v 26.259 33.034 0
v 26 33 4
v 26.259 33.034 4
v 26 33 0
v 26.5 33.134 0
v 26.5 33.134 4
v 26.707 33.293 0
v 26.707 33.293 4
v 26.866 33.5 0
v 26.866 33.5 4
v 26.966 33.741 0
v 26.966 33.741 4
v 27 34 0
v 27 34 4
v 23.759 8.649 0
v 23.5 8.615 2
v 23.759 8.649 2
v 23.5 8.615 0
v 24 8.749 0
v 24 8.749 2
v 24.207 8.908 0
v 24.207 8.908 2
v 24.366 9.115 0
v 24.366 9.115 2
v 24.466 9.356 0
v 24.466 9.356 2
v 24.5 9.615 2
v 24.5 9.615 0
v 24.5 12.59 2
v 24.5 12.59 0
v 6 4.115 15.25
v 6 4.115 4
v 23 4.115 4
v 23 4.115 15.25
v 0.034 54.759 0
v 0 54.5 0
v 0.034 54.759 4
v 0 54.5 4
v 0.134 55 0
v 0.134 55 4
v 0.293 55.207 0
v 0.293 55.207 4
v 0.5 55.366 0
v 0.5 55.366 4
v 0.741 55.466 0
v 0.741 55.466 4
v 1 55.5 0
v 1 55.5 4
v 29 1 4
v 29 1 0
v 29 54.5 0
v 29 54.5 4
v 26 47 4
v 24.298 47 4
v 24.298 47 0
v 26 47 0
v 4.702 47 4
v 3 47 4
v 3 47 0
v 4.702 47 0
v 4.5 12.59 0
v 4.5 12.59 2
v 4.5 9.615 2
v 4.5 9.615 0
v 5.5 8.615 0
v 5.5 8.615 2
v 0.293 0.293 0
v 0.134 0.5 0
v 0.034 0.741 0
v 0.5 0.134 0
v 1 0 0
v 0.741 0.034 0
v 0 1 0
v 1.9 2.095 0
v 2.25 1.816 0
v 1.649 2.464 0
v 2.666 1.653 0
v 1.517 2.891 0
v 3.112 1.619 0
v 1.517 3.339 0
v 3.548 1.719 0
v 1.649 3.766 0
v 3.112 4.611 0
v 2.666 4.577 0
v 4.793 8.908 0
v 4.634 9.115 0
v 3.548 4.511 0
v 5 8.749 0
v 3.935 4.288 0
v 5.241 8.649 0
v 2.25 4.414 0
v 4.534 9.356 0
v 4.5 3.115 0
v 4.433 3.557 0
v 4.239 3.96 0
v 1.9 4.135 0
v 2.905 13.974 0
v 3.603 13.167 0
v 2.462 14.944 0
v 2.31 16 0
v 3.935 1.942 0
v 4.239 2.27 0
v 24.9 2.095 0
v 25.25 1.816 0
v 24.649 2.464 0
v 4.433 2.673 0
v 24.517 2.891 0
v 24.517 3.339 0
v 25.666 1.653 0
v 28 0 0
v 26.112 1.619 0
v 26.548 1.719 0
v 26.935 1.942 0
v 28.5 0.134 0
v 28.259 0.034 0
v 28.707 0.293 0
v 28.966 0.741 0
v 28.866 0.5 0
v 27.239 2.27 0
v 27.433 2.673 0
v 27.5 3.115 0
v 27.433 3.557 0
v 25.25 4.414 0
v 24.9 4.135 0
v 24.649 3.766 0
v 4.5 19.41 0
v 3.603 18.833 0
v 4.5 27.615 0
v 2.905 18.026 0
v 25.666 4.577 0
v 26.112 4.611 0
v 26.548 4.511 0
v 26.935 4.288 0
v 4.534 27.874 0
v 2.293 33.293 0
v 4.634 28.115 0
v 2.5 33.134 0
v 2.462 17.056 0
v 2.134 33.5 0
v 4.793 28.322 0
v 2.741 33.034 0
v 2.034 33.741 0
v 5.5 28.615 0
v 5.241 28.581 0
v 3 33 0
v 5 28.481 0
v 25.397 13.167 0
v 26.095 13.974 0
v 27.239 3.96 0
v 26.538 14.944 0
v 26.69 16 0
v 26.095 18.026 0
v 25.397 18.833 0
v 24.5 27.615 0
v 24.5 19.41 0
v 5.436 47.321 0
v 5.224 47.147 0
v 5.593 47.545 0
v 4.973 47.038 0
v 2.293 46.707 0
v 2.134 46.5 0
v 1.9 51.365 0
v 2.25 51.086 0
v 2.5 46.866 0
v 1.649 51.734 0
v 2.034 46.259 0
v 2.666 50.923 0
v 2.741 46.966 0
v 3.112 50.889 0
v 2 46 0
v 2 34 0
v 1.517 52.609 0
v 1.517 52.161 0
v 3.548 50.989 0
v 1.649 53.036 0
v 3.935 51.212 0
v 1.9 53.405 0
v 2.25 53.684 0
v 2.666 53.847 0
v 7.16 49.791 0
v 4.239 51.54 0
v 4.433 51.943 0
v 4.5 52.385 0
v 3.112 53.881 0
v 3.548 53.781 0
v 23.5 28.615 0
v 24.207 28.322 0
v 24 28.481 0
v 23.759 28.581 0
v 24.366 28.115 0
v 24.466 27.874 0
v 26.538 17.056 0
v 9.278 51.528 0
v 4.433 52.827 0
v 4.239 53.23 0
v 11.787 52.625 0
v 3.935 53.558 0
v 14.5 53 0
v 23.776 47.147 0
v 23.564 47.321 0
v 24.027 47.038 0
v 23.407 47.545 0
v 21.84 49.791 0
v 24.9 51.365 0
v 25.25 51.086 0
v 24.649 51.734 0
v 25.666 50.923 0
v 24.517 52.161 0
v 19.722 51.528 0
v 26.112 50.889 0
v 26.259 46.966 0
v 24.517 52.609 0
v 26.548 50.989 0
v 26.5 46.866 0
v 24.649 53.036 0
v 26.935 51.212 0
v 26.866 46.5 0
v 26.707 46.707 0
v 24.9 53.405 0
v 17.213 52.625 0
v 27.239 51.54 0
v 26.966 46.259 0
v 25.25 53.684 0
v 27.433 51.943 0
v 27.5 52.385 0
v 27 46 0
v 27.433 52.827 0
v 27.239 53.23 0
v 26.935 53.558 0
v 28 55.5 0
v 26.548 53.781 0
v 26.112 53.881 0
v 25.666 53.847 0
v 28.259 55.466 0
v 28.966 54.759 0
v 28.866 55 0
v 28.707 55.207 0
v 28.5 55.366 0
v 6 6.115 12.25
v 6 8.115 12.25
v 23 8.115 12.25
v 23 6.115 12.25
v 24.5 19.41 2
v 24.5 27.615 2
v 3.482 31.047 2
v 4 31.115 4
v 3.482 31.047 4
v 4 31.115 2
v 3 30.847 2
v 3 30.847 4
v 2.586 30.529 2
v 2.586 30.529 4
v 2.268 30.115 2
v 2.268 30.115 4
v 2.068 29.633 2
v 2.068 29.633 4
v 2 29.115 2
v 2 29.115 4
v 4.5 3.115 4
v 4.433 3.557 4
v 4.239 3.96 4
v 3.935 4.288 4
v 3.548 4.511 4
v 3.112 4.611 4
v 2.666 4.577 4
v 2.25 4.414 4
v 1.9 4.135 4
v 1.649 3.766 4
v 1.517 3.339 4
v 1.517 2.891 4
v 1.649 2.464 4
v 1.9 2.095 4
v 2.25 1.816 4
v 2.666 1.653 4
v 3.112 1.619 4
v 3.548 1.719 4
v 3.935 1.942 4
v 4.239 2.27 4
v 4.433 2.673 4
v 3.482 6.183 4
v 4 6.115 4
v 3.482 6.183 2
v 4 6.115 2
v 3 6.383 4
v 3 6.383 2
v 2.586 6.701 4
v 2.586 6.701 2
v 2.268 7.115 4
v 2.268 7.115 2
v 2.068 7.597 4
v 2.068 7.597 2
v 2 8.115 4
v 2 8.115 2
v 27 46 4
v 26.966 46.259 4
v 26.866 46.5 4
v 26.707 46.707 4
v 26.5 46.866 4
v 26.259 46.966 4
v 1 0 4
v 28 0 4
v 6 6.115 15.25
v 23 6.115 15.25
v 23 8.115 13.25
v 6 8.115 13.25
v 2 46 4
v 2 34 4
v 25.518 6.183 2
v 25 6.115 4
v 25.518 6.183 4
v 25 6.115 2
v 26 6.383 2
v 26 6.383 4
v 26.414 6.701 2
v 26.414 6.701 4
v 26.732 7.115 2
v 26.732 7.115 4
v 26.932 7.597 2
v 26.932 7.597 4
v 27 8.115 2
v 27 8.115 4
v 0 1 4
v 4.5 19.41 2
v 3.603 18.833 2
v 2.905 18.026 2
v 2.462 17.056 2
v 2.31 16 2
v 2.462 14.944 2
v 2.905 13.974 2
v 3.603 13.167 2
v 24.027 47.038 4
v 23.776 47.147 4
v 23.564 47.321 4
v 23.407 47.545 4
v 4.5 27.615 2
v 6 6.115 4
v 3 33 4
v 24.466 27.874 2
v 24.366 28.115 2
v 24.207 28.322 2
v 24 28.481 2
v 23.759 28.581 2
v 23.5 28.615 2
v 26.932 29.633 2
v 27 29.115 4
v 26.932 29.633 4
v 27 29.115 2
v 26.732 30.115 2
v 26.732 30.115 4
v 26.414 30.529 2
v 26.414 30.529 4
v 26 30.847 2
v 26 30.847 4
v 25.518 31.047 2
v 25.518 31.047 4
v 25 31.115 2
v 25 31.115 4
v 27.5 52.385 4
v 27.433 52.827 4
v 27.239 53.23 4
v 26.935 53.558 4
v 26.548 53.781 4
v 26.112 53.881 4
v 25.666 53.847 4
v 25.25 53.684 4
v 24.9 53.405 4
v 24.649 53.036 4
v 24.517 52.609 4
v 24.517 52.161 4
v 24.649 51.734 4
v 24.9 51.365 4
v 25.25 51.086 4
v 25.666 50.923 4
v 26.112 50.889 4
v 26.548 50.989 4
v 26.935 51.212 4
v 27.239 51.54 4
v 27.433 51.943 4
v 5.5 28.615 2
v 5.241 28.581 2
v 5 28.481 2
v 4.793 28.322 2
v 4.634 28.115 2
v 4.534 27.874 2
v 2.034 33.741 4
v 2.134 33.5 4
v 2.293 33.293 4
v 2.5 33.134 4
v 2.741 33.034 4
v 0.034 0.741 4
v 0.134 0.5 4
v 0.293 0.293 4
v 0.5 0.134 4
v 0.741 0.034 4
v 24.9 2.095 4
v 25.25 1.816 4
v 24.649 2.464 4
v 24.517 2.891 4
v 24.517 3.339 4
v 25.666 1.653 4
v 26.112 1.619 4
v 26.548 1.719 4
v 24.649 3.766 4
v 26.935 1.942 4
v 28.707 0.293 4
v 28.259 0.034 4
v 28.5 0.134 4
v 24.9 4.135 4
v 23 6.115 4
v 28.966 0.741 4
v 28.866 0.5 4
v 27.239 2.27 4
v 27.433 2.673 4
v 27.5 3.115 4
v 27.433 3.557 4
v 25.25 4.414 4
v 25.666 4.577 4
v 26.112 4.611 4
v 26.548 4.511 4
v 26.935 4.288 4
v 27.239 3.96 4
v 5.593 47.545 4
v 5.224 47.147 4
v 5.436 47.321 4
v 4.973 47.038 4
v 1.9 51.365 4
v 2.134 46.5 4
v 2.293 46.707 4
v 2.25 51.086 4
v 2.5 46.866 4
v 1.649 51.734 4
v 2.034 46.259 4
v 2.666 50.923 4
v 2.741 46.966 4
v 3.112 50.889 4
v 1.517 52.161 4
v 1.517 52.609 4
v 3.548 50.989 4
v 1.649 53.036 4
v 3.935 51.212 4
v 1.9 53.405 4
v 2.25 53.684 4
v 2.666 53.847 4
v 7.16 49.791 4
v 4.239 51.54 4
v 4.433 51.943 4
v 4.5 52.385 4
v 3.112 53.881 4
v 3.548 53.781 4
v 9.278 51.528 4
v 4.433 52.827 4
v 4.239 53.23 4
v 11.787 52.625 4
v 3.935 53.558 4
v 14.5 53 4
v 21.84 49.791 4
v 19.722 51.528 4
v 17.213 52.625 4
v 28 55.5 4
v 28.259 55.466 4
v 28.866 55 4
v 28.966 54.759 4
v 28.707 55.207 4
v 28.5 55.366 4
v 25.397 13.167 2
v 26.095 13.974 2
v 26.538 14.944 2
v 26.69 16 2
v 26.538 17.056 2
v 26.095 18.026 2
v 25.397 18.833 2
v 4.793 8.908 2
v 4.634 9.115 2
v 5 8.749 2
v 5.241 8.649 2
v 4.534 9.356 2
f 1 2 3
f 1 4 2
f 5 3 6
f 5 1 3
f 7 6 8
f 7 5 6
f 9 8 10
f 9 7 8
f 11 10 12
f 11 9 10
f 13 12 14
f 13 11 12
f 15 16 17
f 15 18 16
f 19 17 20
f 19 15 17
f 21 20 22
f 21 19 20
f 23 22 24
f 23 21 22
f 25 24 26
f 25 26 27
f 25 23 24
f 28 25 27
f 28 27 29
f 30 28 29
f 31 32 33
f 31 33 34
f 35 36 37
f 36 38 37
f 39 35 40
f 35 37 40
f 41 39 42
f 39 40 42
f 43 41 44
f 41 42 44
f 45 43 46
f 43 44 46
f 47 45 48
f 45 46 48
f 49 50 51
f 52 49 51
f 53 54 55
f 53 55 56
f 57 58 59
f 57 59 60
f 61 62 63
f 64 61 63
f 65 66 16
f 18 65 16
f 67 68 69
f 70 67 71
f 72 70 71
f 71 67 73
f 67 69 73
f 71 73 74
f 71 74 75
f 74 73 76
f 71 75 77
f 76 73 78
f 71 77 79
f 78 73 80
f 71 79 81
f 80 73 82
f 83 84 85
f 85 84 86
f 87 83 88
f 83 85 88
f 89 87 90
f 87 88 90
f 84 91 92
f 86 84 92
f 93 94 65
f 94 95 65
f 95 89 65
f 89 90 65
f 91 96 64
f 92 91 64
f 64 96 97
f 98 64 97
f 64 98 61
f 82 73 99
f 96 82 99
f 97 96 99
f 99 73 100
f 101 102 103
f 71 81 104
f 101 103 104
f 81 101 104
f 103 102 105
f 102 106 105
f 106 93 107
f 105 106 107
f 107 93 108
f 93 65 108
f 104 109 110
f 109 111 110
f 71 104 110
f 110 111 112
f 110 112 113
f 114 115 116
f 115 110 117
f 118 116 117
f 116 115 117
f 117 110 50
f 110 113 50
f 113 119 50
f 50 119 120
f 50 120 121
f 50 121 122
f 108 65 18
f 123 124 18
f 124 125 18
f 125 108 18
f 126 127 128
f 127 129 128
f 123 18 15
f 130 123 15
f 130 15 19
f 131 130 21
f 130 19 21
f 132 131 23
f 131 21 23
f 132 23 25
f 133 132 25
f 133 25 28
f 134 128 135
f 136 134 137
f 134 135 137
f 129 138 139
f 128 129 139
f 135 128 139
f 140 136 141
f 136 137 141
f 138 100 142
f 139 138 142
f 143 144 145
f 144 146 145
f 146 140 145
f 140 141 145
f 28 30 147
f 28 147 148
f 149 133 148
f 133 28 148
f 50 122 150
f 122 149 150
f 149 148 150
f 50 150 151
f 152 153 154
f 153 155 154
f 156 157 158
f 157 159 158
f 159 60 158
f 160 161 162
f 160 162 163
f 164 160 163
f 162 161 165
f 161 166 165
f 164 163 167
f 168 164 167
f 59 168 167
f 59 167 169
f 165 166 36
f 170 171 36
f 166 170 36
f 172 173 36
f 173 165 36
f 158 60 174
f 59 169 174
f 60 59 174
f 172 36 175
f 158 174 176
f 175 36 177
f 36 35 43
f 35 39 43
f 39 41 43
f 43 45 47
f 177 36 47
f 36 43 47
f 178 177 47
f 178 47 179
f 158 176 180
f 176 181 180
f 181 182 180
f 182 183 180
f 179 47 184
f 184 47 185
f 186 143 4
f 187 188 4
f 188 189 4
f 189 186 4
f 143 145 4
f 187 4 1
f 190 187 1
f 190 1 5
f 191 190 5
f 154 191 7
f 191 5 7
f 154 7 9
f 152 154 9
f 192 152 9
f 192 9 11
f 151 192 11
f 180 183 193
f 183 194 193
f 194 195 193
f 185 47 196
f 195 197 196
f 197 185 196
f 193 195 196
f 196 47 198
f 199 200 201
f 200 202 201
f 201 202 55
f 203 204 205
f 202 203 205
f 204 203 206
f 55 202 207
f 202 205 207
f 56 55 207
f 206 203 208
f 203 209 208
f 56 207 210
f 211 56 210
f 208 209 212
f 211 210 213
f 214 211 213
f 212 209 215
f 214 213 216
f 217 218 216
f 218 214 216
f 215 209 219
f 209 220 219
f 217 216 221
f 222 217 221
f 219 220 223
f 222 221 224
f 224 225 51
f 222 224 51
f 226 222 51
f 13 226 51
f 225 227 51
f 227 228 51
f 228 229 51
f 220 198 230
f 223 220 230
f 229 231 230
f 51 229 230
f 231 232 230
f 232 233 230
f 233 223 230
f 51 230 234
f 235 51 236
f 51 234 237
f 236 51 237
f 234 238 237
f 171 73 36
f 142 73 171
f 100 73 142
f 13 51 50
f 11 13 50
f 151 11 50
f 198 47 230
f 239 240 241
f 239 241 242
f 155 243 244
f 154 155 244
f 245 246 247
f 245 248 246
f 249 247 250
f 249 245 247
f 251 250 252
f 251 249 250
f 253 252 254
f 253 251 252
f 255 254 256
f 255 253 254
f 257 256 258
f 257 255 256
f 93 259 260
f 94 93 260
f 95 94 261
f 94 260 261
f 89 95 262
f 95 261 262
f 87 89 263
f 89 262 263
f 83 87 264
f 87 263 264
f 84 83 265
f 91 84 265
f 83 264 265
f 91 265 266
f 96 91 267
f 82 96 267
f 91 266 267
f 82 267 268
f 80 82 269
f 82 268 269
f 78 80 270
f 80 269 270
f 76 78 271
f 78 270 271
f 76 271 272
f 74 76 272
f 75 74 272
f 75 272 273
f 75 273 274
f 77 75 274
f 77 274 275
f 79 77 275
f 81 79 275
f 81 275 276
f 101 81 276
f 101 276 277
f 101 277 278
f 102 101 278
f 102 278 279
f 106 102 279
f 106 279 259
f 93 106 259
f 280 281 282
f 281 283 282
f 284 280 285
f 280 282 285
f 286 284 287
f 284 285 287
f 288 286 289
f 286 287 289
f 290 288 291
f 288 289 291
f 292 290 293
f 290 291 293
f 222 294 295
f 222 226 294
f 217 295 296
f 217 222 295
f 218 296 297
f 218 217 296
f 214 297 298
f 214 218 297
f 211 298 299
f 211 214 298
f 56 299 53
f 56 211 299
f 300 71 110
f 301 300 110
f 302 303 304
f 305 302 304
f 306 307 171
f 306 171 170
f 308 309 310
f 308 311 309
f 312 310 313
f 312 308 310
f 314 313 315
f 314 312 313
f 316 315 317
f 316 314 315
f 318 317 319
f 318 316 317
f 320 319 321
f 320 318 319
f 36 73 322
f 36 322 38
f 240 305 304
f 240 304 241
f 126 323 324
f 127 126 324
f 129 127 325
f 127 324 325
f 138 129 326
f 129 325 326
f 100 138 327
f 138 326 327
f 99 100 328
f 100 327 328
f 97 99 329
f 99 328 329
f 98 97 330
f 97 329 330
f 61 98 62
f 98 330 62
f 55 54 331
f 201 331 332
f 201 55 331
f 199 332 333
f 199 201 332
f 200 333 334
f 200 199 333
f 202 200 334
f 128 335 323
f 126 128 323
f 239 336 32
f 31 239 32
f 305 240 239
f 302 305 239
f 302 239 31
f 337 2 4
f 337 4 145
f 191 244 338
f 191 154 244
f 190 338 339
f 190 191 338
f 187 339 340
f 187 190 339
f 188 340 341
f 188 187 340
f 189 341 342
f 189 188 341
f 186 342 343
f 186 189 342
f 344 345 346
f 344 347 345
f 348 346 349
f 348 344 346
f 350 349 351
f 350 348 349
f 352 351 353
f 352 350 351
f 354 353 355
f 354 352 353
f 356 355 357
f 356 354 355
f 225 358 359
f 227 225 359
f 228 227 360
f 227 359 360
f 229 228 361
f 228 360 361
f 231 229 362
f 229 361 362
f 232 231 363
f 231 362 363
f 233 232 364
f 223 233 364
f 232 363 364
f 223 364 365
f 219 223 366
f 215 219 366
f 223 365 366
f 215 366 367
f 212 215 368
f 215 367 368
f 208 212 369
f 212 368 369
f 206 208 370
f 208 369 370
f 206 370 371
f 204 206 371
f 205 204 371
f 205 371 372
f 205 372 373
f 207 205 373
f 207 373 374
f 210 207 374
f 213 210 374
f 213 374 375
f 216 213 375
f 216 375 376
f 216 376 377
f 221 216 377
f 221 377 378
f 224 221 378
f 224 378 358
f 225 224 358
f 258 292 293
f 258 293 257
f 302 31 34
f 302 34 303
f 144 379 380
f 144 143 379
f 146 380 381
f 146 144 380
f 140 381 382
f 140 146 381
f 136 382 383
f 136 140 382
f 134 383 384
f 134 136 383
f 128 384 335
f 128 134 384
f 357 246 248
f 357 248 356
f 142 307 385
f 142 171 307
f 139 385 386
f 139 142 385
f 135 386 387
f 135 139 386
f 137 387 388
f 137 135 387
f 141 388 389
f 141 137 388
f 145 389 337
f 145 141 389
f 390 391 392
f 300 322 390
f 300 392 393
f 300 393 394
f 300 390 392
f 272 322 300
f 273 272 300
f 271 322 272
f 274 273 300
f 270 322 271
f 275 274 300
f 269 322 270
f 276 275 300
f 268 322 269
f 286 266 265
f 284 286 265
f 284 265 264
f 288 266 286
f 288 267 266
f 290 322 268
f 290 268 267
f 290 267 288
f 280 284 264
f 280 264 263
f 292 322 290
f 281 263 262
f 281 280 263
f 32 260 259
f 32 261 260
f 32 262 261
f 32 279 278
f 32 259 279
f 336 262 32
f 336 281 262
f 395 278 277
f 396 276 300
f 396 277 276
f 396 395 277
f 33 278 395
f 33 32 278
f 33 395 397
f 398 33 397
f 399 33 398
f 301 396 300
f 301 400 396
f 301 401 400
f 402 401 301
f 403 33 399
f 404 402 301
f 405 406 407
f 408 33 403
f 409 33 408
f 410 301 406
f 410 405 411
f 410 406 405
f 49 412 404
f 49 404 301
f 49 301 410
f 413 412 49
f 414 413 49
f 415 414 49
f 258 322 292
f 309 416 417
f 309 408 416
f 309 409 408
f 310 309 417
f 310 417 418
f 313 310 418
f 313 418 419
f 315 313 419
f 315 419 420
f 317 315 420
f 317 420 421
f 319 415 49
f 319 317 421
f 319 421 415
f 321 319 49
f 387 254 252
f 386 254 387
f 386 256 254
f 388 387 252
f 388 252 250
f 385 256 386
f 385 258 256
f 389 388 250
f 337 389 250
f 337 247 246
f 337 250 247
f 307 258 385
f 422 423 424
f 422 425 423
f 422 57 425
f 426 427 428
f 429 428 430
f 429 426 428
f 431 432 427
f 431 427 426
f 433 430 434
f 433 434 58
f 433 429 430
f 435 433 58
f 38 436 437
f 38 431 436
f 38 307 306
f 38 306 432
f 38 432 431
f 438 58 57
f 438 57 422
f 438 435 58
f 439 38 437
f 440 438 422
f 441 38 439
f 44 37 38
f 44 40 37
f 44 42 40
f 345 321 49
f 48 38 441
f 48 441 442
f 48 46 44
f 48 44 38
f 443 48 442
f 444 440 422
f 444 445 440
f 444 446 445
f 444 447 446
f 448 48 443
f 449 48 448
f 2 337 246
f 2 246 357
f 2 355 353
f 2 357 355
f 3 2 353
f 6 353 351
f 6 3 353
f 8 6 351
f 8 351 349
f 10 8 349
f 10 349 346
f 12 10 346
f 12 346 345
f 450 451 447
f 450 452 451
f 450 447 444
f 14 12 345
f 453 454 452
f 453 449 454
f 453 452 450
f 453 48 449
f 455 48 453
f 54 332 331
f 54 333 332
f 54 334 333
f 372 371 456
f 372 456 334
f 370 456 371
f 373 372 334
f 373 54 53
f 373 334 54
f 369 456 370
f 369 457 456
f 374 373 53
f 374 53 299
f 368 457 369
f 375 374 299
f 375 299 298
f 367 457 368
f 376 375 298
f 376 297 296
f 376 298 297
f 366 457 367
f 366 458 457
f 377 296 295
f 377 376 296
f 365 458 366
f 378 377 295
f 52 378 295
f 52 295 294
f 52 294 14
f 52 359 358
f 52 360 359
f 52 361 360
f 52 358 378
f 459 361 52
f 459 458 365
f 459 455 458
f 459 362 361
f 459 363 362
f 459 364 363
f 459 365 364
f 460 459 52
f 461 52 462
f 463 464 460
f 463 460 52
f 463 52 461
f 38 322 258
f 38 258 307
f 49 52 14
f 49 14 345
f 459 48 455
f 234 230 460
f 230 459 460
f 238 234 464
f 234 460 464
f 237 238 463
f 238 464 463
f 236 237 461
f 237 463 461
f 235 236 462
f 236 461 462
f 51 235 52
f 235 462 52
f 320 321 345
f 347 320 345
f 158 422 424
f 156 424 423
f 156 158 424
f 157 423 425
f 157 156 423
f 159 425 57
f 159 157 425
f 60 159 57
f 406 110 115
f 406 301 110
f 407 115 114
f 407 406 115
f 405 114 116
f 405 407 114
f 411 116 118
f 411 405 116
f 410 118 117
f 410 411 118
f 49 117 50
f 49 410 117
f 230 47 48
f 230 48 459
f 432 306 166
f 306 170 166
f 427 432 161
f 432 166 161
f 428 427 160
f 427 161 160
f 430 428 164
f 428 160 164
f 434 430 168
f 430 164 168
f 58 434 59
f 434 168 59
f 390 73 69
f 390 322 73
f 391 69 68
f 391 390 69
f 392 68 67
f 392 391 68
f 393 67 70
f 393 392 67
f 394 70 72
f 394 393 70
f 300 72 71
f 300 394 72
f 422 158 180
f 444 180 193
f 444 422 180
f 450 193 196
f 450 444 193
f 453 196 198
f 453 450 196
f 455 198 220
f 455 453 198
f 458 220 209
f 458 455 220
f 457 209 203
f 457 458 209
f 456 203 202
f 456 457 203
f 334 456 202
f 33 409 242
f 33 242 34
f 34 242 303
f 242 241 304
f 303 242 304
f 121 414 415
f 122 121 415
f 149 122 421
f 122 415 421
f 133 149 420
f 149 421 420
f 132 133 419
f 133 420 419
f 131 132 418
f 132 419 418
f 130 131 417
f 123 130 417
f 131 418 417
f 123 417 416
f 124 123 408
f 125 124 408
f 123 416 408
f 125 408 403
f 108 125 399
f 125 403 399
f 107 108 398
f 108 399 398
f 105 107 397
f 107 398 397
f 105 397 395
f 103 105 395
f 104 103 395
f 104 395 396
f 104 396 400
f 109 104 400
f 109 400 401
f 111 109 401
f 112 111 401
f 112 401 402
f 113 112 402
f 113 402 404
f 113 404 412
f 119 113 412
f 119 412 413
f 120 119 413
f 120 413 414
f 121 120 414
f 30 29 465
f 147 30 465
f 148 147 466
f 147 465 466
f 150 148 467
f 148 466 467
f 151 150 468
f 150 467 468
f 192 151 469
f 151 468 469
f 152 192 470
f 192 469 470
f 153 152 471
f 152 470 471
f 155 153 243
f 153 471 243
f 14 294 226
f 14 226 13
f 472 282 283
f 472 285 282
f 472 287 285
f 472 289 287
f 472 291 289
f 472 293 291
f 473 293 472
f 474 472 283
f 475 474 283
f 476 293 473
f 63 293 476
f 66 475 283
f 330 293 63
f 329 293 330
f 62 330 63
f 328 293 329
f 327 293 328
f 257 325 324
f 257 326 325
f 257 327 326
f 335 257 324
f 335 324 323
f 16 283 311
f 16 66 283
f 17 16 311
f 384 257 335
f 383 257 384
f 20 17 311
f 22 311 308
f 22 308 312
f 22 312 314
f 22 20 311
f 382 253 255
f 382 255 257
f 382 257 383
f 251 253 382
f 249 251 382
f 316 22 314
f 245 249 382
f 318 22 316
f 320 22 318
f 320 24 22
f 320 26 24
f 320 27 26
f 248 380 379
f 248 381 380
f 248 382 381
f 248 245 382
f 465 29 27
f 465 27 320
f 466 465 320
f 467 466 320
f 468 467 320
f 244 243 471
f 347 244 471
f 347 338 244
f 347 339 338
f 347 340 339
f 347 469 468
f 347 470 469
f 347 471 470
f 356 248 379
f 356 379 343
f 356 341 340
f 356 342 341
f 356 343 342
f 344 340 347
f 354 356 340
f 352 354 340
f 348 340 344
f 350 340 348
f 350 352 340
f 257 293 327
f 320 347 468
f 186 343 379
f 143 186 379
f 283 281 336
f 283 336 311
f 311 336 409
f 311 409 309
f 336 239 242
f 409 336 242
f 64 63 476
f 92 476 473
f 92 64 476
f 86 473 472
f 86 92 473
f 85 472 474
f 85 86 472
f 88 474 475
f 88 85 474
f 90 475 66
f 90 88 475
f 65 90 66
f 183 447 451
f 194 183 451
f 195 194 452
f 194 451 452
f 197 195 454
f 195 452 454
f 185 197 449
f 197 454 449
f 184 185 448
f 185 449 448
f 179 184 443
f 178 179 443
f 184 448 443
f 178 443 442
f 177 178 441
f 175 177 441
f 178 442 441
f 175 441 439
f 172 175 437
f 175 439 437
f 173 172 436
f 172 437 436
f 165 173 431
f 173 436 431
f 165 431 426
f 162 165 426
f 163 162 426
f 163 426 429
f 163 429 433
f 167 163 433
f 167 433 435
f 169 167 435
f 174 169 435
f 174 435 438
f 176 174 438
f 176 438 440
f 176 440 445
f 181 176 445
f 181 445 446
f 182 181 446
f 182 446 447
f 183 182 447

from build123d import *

# Parameters (mm, degrees)
SKETCH1_W             = 29
SKETCH1_H             = 55.5
BODY_DEPTH            = 4
SKETCH2_R             = 1.5
BOLT_HOLES_DEPTH      = 5
SERVO_CLEARANCE_DEPTH = 5
SKETCH4_W             = 25
SKETCH4_H             = 25
FAN_RECESS_DEPTH      = 2
CLAMP_FILLETS_R       = 1
FAN_FILLETS_R         = 2
SKETCH5_W             = 17
SKETCH5_H             = 2
CLAMP_BASE_DEPTH      = 8.25
CLAMP_HOOK_DEPTH      = 17


with BuildPart() as part:
    # Sketch1 → Body (new body)
    with BuildSketch(Plane.XY):
        with Locations((14.5, 27.75)):
            Rectangle(SKETCH1_W, SKETCH1_H)
    extrude(amount=BODY_DEPTH)

    # Sketch2 → Bolt Holes (cut, through all)
    with BuildSketch(Plane.XY.offset(4)):
        with Locations((3, 52.385)):
            Circle(SKETCH2_R)
        with Locations((26, 52.385)):
            Circle(SKETCH2_R)
        with Locations((26, 3.115)):
            Circle(SKETCH2_R)
        with Locations((3, 3.115)):
            Circle(SKETCH2_R)
    extrude(amount=-BOLT_HOLES_DEPTH, mode=Mode.SUBTRACT)

    # Sketch3 → Servo Clearance (cut, through all)
    with BuildSketch(Plane.XY.offset(4)):
        with BuildLine():
            Line((4.5, 12.5898827), (4.5, 8.615))
            Line((4.5, 8.615), (24.5, 8.615))
            Line((24.5, 8.615), (24.5, 12.5898827))
            ThreePointArc((24.5, 12.5898827), (26.69, 16), (24.5, 19.4101173))
            Line((24.5, 19.4101173), (24.5, 28.615))
            Line((24.5, 28.615), (4.5, 28.615))
            Line((4.5, 28.615), (4.5, 19.4101173))
            ThreePointArc((4.5, 19.4101173), (2.31, 16), (4.5, 12.5898827))
        make_face()
        with BuildLine():
            Line((2, 47), (5.33484861, 47))
            ThreePointArc((5.33484861, 47), (14.5, 53), (23.66515139, 47))
            Line((23.66515139, 47), (27, 47))
            Line((27, 47), (27, 33))
            Line((27, 33), (2, 33))
            Line((2, 33), (2, 47))
        make_face()
    extrude(amount=-SERVO_CLEARANCE_DEPTH, mode=Mode.SUBTRACT)

    # Sketch4 → Fan Recess (cut)
    with BuildSketch(Plane.XY.offset(4)):
        with Locations((14.5, 18.615)):
            Rectangle(SKETCH4_W, SKETCH4_H)
    extrude(amount=-FAN_RECESS_DEPTH, mode=Mode.SUBTRACT)

    # Clamp Fillets
    clamp_fillets_edges = [part.edges().sort_by_distance(p)[0] for p in [
        (4.5, 28.615, 1),
        (24.5, 28.615, 1),
        (24.5, 8.615, 1),
        (4.5, 8.615, 1),
        (2, 33, 2),
        (2, 47, 2),
        (5.33484861, 47, 2),
        (23.66515139, 47, 2),
        (27, 47, 2),
        (27, 33, 2),
        (0, 55.5, 2),
        (29, 55.5, 2),
        (29, 0, 2),
        (0, 0, 2),
    ]]
    fillet(clamp_fillets_edges, radius=CLAMP_FILLETS_R)

    # Fan Fillets
    fan_fillets_edges = [part.edges().sort_by_distance(p)[0] for p in [
        (27, 6.115, 3),
        (27, 31.115, 3),
        (2, 31.115, 3),
        (2, 6.115, 3),
    ]]
    fillet(fan_fillets_edges, radius=FAN_FILLETS_R)

    # Sketch5 → Clamp Base (add)
    with BuildSketch(Plane.XY.offset(4)):
        with Locations((14.5, 5.115)):
            Rectangle(SKETCH5_W, SKETCH5_H)
    extrude(amount=CLAMP_BASE_DEPTH)

    # Sketch7 → Clamp Hook (add)
    with BuildSketch(Plane.ZY.offset(-6)):
        Polygon((12.25, 4.115), (15.25, 4.115), (15.25, 6.115), (13.25, 8.115), (12.25, 8.115), align=None)
    extrude(amount=-CLAMP_HOOK_DEPTH)


solid = part.part
